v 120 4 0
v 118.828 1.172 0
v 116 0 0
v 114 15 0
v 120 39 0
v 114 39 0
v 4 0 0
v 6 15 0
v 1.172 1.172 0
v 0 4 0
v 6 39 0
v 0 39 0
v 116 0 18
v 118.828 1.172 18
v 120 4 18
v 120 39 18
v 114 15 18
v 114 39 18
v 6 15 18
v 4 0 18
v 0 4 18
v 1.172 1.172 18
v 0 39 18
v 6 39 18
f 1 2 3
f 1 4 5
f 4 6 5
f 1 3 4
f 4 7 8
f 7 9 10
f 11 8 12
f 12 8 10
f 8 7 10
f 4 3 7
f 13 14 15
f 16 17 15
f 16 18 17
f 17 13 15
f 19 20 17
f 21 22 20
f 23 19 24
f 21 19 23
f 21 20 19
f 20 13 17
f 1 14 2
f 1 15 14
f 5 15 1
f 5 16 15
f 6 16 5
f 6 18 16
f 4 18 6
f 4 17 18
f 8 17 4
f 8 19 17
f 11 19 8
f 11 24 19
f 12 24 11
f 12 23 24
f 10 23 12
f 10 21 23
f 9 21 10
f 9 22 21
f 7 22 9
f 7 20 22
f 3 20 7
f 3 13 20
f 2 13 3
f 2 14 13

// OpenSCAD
$fn = 32;

// ----------------------------------------------------------------------
// Heat sink frame: 120 x 39 mm frame, 6 mm walls
// ----------------------------------------------------------------------

// --- parameters (mm) ---
profile_height = 18;      // extrusion height
profile_points = 12;      // points of the closed outline

profile = [[0, 4], [1.172, 1.172], [4, 0], [116, 0], [118.828, 1.172], [120, 4], [120, 39], [114, 39], [114, 15], [6, 15], [6, 39], [0, 39]];  // single closed polygon, 12 points, counter clockwise

// --- the one profile operation ---
linear_extrude(height = profile_height) polygon(points = profile);
